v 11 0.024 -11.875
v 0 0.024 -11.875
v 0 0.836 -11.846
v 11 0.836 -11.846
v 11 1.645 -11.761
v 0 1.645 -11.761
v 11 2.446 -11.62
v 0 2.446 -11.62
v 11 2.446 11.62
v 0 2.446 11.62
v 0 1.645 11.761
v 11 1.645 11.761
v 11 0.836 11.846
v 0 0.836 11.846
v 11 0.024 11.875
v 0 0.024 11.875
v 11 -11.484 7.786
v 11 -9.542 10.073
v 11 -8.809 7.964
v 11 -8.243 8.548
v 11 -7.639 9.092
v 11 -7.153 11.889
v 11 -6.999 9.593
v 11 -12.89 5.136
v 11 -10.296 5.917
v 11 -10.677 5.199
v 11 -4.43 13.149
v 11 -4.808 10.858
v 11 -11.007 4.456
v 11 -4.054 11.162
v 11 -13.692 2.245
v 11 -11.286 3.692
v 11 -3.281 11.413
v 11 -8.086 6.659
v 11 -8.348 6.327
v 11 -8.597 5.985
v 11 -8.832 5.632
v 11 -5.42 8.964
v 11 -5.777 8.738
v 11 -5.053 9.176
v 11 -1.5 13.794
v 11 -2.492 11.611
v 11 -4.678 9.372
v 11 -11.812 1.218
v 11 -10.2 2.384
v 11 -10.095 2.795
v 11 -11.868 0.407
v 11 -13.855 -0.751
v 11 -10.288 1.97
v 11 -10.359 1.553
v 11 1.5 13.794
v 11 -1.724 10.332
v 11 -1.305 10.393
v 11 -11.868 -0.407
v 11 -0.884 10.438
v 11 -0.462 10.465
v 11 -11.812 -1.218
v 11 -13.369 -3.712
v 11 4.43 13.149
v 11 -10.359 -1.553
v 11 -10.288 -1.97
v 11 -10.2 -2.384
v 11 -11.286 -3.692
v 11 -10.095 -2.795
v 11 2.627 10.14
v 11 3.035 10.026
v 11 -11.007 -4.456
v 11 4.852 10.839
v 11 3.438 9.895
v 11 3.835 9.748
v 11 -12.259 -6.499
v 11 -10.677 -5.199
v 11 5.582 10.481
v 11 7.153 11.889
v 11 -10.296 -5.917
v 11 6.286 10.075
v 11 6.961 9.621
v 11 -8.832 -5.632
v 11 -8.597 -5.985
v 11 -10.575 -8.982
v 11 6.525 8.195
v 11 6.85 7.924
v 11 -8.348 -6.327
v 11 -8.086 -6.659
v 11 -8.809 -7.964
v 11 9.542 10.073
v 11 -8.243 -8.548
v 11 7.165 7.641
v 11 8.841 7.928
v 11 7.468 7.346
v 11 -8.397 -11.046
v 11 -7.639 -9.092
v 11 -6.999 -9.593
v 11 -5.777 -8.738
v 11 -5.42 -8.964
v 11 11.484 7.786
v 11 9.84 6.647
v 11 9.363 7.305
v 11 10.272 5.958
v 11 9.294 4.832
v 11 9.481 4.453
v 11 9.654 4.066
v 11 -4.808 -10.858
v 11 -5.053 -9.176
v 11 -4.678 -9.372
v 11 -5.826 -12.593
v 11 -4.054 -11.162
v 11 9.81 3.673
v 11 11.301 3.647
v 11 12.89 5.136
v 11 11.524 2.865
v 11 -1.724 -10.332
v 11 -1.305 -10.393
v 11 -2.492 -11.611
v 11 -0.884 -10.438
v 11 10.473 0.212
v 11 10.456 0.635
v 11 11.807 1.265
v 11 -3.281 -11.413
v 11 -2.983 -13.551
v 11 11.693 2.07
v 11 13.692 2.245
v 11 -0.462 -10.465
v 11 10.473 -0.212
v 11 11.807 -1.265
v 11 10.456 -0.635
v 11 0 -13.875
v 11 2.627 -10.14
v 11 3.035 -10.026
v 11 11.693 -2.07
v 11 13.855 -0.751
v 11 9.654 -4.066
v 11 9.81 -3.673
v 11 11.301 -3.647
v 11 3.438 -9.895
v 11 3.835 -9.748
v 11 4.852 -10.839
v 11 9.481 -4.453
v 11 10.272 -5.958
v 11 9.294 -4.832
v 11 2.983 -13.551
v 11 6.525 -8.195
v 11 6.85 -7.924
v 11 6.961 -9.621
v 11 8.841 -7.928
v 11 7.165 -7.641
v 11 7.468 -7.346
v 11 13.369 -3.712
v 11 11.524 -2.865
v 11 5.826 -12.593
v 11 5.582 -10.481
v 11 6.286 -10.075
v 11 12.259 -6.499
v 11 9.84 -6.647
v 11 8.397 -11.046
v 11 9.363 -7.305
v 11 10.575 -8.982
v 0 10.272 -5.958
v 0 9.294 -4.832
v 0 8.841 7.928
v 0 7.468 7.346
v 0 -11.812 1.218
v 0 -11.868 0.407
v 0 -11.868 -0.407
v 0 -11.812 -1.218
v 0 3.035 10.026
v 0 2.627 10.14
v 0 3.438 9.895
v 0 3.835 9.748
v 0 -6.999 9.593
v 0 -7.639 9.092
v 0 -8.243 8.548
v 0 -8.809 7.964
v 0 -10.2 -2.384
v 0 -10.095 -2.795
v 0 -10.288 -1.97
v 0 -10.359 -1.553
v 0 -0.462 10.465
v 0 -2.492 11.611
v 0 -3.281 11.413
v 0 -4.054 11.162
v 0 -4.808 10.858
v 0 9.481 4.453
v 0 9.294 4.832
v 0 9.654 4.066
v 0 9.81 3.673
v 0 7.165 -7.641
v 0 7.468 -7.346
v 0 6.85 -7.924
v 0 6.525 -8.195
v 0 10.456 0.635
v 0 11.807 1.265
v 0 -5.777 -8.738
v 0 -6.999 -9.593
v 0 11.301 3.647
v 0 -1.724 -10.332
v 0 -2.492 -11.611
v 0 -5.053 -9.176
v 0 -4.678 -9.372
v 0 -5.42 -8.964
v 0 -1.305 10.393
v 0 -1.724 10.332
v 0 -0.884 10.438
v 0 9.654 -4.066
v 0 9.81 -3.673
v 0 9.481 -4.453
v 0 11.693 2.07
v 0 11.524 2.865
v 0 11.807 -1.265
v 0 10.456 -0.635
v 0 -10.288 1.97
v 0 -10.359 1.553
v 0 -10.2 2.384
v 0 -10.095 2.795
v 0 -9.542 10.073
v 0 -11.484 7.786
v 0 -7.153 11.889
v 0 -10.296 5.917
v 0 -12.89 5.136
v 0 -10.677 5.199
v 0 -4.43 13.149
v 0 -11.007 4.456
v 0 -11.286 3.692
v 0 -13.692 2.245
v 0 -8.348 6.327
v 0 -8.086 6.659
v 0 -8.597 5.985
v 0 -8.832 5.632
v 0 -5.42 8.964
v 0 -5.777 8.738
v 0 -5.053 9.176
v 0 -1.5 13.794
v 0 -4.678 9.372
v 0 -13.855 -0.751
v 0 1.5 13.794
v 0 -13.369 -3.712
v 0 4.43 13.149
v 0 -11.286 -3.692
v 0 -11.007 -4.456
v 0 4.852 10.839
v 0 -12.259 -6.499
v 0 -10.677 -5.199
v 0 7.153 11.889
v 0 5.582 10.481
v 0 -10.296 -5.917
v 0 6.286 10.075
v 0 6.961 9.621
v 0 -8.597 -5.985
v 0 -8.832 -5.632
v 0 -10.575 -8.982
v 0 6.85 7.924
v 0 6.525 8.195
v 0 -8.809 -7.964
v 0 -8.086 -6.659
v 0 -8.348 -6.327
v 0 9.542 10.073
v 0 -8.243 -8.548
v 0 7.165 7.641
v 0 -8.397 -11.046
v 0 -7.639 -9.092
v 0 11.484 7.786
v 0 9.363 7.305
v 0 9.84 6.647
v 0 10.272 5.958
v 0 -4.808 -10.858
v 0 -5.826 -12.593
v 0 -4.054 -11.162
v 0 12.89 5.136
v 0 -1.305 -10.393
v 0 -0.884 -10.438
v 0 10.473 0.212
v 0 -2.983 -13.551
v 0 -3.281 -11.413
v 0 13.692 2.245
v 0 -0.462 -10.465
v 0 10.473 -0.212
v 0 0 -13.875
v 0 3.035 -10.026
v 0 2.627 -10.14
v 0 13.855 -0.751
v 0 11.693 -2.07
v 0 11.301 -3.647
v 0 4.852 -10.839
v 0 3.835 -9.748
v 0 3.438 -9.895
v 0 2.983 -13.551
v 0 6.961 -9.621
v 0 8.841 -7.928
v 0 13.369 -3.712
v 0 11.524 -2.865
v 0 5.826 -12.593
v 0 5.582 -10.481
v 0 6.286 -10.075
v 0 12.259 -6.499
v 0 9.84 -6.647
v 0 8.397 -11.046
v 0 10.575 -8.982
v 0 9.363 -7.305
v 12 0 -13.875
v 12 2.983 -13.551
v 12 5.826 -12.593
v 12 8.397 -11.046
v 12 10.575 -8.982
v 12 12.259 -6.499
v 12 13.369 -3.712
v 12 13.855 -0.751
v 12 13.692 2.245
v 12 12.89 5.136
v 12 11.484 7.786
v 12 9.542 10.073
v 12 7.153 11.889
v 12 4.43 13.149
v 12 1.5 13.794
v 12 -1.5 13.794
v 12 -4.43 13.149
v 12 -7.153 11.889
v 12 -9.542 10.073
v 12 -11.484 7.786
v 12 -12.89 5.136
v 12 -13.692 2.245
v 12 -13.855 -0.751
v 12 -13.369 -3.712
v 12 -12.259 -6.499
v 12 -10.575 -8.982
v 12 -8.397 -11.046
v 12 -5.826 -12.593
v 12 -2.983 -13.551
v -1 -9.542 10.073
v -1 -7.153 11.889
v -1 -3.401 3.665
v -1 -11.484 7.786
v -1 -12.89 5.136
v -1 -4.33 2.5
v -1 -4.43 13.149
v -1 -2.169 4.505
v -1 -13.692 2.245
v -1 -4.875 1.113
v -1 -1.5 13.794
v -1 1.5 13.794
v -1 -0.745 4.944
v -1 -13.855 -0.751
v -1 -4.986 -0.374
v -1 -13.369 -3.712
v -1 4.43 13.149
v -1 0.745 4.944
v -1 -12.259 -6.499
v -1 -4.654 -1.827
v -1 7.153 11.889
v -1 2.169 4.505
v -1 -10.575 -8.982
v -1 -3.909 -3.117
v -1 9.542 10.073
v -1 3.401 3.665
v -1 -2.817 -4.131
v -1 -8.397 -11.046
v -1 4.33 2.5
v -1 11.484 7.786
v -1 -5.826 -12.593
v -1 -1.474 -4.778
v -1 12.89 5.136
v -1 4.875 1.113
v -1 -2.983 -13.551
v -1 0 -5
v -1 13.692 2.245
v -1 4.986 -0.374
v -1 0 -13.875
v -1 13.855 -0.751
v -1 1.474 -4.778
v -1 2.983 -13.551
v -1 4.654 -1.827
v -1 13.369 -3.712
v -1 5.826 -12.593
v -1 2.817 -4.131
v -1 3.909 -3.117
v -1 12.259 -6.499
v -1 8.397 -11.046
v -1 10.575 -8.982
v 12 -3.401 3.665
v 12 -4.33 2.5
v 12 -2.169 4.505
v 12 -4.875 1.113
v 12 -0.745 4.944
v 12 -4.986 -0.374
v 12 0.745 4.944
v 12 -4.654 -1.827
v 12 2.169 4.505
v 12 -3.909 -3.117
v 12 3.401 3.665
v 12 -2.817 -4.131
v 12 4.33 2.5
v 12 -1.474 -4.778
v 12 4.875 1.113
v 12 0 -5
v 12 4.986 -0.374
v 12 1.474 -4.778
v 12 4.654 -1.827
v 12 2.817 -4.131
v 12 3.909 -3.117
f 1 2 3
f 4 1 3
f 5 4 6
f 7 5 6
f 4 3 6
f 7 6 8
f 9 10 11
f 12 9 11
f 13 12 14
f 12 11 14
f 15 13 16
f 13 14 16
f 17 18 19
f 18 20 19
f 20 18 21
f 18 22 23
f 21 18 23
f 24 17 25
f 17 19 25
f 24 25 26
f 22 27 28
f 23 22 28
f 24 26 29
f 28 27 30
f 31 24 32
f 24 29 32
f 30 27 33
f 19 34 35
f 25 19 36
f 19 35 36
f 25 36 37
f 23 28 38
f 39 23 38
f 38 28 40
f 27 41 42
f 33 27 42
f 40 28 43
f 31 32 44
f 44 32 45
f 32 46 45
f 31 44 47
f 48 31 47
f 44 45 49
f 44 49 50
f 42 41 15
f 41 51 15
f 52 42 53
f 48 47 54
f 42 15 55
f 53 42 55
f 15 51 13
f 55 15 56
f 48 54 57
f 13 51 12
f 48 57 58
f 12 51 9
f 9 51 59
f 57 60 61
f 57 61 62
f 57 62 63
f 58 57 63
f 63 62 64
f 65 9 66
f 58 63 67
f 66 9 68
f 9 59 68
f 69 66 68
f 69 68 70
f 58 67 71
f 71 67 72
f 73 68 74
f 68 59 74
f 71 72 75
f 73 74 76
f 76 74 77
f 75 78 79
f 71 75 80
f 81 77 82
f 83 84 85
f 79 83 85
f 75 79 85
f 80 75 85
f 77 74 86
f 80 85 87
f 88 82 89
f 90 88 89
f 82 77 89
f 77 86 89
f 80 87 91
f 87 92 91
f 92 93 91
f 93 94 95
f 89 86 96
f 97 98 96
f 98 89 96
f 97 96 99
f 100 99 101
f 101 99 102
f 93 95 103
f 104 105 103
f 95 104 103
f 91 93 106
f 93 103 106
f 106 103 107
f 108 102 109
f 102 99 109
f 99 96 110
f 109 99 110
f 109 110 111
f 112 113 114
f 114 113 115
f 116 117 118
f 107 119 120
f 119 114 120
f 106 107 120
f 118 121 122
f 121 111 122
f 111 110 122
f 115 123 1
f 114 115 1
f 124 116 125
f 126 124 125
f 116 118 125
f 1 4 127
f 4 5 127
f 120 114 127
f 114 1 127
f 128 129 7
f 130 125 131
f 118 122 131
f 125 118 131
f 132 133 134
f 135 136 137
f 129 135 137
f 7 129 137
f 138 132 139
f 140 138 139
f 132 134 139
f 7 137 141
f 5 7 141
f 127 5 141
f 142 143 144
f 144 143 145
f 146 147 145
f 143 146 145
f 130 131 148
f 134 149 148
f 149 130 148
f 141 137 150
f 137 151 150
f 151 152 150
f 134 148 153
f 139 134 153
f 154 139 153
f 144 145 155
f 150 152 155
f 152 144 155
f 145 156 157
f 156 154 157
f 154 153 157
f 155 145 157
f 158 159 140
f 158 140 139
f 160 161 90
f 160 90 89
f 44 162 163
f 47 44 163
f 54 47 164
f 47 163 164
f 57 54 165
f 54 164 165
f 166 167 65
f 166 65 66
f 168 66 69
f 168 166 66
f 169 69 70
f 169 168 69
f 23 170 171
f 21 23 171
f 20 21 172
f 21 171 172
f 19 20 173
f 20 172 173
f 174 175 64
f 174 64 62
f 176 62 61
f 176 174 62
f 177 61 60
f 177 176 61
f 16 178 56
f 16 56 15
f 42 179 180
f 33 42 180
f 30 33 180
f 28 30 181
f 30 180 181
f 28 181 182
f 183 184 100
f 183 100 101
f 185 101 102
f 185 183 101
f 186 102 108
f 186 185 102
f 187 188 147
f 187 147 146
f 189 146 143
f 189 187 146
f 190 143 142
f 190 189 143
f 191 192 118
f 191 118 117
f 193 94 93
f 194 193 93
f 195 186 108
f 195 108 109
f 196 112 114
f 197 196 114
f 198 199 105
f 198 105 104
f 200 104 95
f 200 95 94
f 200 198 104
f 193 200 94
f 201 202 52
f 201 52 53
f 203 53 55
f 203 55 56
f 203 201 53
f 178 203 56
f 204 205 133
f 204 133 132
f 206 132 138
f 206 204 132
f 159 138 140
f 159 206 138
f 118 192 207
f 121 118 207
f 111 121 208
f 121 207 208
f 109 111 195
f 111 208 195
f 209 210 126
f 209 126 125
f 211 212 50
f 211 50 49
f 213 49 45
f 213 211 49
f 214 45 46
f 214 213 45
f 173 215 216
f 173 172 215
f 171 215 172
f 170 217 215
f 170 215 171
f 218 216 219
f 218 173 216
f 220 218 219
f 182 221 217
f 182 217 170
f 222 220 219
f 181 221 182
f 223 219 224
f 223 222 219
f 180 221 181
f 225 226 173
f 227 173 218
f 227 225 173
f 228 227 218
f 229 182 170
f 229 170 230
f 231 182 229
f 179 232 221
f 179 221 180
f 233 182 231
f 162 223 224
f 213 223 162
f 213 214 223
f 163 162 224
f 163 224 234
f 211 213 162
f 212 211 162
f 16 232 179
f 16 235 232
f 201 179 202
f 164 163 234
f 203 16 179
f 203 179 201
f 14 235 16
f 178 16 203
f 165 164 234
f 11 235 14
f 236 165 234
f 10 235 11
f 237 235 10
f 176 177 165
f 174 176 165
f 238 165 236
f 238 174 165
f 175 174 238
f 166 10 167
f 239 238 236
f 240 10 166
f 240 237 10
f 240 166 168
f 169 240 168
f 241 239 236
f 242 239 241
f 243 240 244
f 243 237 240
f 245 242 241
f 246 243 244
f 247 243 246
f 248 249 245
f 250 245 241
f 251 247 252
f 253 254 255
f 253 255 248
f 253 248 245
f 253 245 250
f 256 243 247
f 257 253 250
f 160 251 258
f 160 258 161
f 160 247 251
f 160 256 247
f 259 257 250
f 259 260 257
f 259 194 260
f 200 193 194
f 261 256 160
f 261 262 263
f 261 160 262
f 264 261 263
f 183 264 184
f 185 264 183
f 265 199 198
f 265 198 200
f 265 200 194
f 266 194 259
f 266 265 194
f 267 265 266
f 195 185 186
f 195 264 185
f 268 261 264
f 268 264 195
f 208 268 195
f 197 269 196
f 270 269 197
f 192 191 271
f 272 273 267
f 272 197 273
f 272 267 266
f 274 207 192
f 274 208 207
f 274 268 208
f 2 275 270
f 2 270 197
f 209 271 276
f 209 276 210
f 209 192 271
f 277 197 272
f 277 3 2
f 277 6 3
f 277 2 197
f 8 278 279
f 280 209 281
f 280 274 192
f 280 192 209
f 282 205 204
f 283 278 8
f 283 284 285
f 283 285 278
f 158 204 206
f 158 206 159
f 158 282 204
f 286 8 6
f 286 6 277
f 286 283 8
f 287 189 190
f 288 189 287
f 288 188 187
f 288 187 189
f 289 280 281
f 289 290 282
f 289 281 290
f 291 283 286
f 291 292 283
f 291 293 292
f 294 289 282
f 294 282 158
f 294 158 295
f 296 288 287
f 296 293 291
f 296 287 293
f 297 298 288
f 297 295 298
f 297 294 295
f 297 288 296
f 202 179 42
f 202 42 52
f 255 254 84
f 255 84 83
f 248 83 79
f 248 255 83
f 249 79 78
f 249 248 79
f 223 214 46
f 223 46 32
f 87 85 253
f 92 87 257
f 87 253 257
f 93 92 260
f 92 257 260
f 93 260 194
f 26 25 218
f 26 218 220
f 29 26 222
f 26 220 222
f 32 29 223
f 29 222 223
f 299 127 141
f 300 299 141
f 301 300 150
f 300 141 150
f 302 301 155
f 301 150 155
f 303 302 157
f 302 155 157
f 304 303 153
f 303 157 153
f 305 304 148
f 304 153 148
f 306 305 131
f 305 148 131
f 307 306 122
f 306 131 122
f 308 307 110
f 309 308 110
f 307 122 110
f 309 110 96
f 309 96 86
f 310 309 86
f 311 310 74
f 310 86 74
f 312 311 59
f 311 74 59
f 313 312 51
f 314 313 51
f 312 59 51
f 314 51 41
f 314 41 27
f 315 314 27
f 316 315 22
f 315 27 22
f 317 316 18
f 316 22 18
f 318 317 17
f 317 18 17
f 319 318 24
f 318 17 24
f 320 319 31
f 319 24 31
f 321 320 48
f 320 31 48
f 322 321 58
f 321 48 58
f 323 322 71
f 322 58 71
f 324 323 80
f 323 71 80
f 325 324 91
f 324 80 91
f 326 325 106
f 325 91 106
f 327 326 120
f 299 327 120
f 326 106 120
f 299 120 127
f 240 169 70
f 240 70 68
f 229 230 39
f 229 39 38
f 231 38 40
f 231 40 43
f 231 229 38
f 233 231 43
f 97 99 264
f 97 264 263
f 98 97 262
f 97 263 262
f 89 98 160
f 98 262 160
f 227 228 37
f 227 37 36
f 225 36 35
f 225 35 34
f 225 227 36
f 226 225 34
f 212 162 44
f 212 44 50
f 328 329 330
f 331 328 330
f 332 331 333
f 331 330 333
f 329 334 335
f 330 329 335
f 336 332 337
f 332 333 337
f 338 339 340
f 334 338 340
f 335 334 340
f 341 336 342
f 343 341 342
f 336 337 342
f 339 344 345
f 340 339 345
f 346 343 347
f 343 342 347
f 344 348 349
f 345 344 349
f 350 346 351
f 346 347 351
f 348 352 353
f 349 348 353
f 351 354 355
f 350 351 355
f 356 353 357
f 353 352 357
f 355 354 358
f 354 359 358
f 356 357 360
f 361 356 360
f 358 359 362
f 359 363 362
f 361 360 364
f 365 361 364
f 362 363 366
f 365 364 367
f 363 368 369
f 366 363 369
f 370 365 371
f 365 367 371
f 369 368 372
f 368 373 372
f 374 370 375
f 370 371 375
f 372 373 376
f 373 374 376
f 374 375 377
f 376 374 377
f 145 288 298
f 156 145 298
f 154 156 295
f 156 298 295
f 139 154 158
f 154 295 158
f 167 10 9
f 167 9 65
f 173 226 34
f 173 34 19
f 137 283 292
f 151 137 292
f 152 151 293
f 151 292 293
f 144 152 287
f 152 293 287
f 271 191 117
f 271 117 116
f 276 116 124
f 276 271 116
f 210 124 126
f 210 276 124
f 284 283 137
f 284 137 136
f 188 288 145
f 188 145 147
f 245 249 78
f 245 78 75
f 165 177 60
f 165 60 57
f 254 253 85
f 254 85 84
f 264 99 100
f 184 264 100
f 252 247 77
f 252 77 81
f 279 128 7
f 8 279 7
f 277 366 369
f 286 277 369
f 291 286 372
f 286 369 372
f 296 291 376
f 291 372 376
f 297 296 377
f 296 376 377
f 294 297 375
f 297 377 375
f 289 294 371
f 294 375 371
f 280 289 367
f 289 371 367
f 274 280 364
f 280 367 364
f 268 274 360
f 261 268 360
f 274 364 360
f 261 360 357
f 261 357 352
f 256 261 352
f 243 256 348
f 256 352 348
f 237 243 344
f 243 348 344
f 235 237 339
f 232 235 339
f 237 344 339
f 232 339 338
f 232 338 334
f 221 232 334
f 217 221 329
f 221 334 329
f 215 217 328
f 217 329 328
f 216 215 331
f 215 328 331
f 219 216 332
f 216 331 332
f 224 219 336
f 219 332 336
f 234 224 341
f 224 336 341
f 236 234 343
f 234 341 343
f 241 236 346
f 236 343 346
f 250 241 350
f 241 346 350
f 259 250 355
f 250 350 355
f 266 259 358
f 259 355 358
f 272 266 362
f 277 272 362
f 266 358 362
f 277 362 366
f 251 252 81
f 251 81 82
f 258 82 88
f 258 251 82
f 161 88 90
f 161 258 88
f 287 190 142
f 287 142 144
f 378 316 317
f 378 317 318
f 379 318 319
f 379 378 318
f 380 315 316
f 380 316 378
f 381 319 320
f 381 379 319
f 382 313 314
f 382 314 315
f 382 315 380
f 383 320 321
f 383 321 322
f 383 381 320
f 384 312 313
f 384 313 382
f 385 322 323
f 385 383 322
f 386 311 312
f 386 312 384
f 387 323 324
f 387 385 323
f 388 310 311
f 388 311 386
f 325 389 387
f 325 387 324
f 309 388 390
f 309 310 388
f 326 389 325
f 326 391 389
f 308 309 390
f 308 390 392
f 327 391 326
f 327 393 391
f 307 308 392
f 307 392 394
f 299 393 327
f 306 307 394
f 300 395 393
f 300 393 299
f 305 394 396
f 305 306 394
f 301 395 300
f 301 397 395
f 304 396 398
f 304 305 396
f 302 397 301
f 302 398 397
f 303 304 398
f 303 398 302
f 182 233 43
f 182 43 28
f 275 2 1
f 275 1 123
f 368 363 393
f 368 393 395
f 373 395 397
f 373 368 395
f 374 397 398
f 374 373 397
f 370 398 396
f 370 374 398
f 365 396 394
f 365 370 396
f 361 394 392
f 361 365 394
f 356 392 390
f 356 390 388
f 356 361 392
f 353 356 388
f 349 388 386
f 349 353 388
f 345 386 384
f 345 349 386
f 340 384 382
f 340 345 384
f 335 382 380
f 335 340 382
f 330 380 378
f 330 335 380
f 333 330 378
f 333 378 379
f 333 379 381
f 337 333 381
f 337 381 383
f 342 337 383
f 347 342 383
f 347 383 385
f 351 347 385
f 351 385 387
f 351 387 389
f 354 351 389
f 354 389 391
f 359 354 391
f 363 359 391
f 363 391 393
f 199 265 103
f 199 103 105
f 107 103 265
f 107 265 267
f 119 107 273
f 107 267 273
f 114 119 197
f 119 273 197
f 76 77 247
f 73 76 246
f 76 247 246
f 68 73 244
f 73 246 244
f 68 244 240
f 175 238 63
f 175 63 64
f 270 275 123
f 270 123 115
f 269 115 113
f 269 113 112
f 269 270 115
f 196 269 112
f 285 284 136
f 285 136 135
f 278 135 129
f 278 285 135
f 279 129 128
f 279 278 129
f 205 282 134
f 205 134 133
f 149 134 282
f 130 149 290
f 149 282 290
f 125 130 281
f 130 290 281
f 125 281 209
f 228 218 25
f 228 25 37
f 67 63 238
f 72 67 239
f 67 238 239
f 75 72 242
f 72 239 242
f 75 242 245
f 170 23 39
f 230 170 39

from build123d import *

# Parameters (mm, degrees)
SKETCH1_R           = 11.875
SKETCH1_R_2         = 5
BOSS_EXTRUDE1_DEPTH = 11
CUT_EXTRUDE1_DEPTH  = 21.075638221
SKETCH4_R           = 13.875
SKETCH4_R_2         = 5
BOSS_EXTRUDE2_DEPTH = 1
LPATTERN1_COUNT     = 2
LPATTERN1_PITCH     = 12


with BuildPart() as part:
    # Sketch1 → Boss-Extrude1 (new body)
    with BuildSketch(Plane(origin=(0, 0, 0), x_dir=(0, 0, -1), z_dir=(1, 0, 0))):
        Circle(SKETCH1_R)
        Circle(SKETCH1_R_2, mode=Mode.SUBTRACT)
    extrude(amount=BOSS_EXTRUDE1_DEPTH)

    # Sketch2 → Cut-Extrude1 (cut, through all)
    with BuildSketch(Plane.ZY):
        with BuildLine():
            Line((1.26491017, 11.807439488), (0.63461115, 10.455758877))
            ThreePointArc((0.63461115, 10.455758877), (0, 10.475), (-0.63461115, 10.455758877))
            Line((-0.63461115, 10.455758877), (-1.26491017, 11.807439488))
            ThreePointArc((-1.26491017, 11.807439488), (0, 11.875), (1.26491017, 11.807439488))
        make_face()
        with BuildLine():
            Line((5.958071241, 10.272147394), (4.8324864, 9.293691419))
            ThreePointArc((4.8324864, 9.293691419), (4.260566336, 9.569388669), (3.672994133, 9.809930637))
            Line((3.672994133, 9.809930637), (3.64696536, 11.301118027))
            ThreePointArc((3.64696536, 11.301118027), (4.829997637, 10.84835231), (5.958071241, 10.272147394))
        make_face()
        with BuildLine():
            Line((9.621027667, 6.960707696), (8.194780849, 6.524660285))
            ThreePointArc((8.194780849, 6.524660285), (7.784442047, 7.009143102), (7.345505362, 7.467876269))
            Line((7.345505362, 7.467876269), (7.928247448, 8.840730592))
            ThreePointArc((7.928247448, 8.840730592), (8.824844803, 7.945925951), (9.621027667, 6.960707696))
        make_face()
        with BuildLine():
            Line((11.620421005, 2.445698402), (10.140123243, 2.627456112))
            ThreePointArc((10.140123243, 2.627456112), (9.962317008, 3.236953016), (9.747911982, 3.834558252))
            Line((9.747911982, 3.834558252), (10.838663527, 4.851700522))
            ThreePointArc((10.838663527, 4.851700522), (11.293796131, 3.669576808), (11.620421005, 2.445698402))
        make_face()
        with BuildLine():
            Line((11.610537983, -2.492194365), (10.332146207, -1.724059091))
            ThreePointArc((10.332146207, -1.724059091), (10.417616854, -1.094935653), (10.464816064, -0.461789724))
            Line((10.464816064, -0.461789724), (11.874976215, 0.023767355))
            ThreePointArc((11.874976215, 0.023767355), (11.809947507, -1.241275501), (11.610537983, -2.492194365))
        make_face()
        with BuildLine():
            Line((9.593087465, -6.999164085), (8.737647228, -5.777468816))
            ThreePointArc((8.737647228, -5.777468816), (9.071616105, -5.2375), (9.372258378, -4.678290061))
            Line((9.372258378, -4.678290061), (10.857997635, -4.808275403))
            ThreePointArc((10.857997635, -4.808275403), (10.28405167, -5.9375), (9.593087465, -6.999164085))
        make_face()
        with BuildLine():
            Line((5.916904974, -10.295914749), (5.632329664, -8.831901695))
            ThreePointArc((5.632329664, -8.831901695), (6.157050518, -8.474453016), (6.659152074, -8.085871545))
            Line((6.659152074, -8.085871545), (7.963572623, -8.808923662))
            ThreePointArc((7.963572623, -8.808923662), (6.979949871, -9.607076808), (5.916904974, -10.295914749))
        make_face()
        with BuildLine():
            Line((1.21763586, -11.812408218), (1.553131133, -10.359218536))
            ThreePointArc((1.553131133, -10.359218536), (2.177874961, -10.246096118), (2.794617881, -10.095332382))
            Line((2.794617881, -10.095332382), (3.692173556, -11.286428994))
            ThreePointArc((3.692173556, -11.286428994), (2.468951328, -11.615502759), (1.21763586, -11.812408218))
        make_face()
        with BuildLine():
            Line((-3.692173556, -11.286428994), (-2.794617881, -10.095332382))
            ThreePointArc((-2.794617881, -10.095332382), (-2.177874961, -10.246096118), (-1.553131133, -10.359218536))
            Line((-1.553131133, -10.359218536), (-1.21763586, -11.812408218))
            ThreePointArc((-1.21763586, -11.812408218), (-2.468951328, -11.615502759), (-3.692173556, -11.286428994))
        make_face()
        with BuildLine():
            Line((-7.963572623, -8.808923662), (-6.659152074, -8.085871545))
            ThreePointArc((-6.659152074, -8.085871545), (-6.157050518, -8.474453016), (-5.632329664, -8.831901695))
            Line((-5.632329664, -8.831901695), (-5.916904974, -10.295914749))
            ThreePointArc((-5.916904974, -10.295914749), (-6.979949871, -9.607076808), (-7.963572623, -8.808923662))
        make_face()
        with BuildLine():
            Line((-10.857997635, -4.808275403), (-9.372258378, -4.678290061))
            ThreePointArc((-9.372258378, -4.678290061), (-9.071616105, -5.2375), (-8.737647228, -5.777468816))
            Line((-8.737647228, -5.777468816), (-9.593087465, -6.999164085))
            ThreePointArc((-9.593087465, -6.999164085), (-10.28405167, -5.9375), (-10.857997635, -4.808275403))
        make_face()
        with BuildLine():
            Line((-11.874976215, 0.023767355), (-10.464816064, -0.461789724))
            ThreePointArc((-10.464816064, -0.461789724), (-10.417616854, -1.094935653), (-10.332146207, -1.724059091))
            Line((-10.332146207, -1.724059091), (-11.610537983, -2.492194365))
            ThreePointArc((-11.610537983, -2.492194365), (-11.809947507, -1.241275501), (-11.874976215, 0.023767355))
        make_face()
        with BuildLine():
            Line((-10.838663527, 4.851700522), (-9.747911982, 3.834558252))
            ThreePointArc((-9.747911982, 3.834558252), (-9.962317008, 3.236953016), (-10.140123243, 2.627456112))
            Line((-10.140123243, 2.627456112), (-11.620421005, 2.445698402))
            ThreePointArc((-11.620421005, 2.445698402), (-11.293796131, 3.669576808), (-10.838663527, 4.851700522))
        make_face()
        with BuildLine():
            Line((-7.928247448, 8.840730592), (-7.345505362, 7.467876269))
            ThreePointArc((-7.345505362, 7.467876269), (-7.784442047, 7.009143102), (-8.194780849, 6.524660285))
            Line((-8.194780849, 6.524660285), (-9.621027667, 6.960707696))
            ThreePointArc((-9.621027667, 6.960707696), (-8.824844803, 7.945925951), (-7.928247448, 8.840730592))
        make_face()
        with BuildLine():
            Line((-3.64696536, 11.301118027), (-3.672994133, 9.809930637))
            ThreePointArc((-3.672994133, 9.809930637), (-4.260566336, 9.569388669), (-4.8324864, 9.293691419))
            Line((-4.8324864, 9.293691419), (-5.958071241, 10.272147394))
            ThreePointArc((-5.958071241, 10.272147394), (-4.829997637, 10.84835231), (-3.64696536, 11.301118027))
        make_face()
    extrude(amount=-CUT_EXTRUDE1_DEPTH, mode=Mode.SUBTRACT)

    # Sketch4 → Boss-Extrude2 (add)
    with BuildSketch(Plane(origin=(11, 0, 0), x_dir=(0, 0, -1), z_dir=(1, 0, 0))):
        Circle(SKETCH4_R)
        Circle(SKETCH4_R_2, mode=Mode.SUBTRACT)
    boss_extrude2 = extrude(amount=BOSS_EXTRUDE2_DEPTH)

    # LPattern1: Boss-Extrude2 ×2
    with Locations(*[(-i * LPATTERN1_PITCH, 0, 0) for i in range(1, LPATTERN1_COUNT)]):
        add(boss_extrude2)


solid = part.part
